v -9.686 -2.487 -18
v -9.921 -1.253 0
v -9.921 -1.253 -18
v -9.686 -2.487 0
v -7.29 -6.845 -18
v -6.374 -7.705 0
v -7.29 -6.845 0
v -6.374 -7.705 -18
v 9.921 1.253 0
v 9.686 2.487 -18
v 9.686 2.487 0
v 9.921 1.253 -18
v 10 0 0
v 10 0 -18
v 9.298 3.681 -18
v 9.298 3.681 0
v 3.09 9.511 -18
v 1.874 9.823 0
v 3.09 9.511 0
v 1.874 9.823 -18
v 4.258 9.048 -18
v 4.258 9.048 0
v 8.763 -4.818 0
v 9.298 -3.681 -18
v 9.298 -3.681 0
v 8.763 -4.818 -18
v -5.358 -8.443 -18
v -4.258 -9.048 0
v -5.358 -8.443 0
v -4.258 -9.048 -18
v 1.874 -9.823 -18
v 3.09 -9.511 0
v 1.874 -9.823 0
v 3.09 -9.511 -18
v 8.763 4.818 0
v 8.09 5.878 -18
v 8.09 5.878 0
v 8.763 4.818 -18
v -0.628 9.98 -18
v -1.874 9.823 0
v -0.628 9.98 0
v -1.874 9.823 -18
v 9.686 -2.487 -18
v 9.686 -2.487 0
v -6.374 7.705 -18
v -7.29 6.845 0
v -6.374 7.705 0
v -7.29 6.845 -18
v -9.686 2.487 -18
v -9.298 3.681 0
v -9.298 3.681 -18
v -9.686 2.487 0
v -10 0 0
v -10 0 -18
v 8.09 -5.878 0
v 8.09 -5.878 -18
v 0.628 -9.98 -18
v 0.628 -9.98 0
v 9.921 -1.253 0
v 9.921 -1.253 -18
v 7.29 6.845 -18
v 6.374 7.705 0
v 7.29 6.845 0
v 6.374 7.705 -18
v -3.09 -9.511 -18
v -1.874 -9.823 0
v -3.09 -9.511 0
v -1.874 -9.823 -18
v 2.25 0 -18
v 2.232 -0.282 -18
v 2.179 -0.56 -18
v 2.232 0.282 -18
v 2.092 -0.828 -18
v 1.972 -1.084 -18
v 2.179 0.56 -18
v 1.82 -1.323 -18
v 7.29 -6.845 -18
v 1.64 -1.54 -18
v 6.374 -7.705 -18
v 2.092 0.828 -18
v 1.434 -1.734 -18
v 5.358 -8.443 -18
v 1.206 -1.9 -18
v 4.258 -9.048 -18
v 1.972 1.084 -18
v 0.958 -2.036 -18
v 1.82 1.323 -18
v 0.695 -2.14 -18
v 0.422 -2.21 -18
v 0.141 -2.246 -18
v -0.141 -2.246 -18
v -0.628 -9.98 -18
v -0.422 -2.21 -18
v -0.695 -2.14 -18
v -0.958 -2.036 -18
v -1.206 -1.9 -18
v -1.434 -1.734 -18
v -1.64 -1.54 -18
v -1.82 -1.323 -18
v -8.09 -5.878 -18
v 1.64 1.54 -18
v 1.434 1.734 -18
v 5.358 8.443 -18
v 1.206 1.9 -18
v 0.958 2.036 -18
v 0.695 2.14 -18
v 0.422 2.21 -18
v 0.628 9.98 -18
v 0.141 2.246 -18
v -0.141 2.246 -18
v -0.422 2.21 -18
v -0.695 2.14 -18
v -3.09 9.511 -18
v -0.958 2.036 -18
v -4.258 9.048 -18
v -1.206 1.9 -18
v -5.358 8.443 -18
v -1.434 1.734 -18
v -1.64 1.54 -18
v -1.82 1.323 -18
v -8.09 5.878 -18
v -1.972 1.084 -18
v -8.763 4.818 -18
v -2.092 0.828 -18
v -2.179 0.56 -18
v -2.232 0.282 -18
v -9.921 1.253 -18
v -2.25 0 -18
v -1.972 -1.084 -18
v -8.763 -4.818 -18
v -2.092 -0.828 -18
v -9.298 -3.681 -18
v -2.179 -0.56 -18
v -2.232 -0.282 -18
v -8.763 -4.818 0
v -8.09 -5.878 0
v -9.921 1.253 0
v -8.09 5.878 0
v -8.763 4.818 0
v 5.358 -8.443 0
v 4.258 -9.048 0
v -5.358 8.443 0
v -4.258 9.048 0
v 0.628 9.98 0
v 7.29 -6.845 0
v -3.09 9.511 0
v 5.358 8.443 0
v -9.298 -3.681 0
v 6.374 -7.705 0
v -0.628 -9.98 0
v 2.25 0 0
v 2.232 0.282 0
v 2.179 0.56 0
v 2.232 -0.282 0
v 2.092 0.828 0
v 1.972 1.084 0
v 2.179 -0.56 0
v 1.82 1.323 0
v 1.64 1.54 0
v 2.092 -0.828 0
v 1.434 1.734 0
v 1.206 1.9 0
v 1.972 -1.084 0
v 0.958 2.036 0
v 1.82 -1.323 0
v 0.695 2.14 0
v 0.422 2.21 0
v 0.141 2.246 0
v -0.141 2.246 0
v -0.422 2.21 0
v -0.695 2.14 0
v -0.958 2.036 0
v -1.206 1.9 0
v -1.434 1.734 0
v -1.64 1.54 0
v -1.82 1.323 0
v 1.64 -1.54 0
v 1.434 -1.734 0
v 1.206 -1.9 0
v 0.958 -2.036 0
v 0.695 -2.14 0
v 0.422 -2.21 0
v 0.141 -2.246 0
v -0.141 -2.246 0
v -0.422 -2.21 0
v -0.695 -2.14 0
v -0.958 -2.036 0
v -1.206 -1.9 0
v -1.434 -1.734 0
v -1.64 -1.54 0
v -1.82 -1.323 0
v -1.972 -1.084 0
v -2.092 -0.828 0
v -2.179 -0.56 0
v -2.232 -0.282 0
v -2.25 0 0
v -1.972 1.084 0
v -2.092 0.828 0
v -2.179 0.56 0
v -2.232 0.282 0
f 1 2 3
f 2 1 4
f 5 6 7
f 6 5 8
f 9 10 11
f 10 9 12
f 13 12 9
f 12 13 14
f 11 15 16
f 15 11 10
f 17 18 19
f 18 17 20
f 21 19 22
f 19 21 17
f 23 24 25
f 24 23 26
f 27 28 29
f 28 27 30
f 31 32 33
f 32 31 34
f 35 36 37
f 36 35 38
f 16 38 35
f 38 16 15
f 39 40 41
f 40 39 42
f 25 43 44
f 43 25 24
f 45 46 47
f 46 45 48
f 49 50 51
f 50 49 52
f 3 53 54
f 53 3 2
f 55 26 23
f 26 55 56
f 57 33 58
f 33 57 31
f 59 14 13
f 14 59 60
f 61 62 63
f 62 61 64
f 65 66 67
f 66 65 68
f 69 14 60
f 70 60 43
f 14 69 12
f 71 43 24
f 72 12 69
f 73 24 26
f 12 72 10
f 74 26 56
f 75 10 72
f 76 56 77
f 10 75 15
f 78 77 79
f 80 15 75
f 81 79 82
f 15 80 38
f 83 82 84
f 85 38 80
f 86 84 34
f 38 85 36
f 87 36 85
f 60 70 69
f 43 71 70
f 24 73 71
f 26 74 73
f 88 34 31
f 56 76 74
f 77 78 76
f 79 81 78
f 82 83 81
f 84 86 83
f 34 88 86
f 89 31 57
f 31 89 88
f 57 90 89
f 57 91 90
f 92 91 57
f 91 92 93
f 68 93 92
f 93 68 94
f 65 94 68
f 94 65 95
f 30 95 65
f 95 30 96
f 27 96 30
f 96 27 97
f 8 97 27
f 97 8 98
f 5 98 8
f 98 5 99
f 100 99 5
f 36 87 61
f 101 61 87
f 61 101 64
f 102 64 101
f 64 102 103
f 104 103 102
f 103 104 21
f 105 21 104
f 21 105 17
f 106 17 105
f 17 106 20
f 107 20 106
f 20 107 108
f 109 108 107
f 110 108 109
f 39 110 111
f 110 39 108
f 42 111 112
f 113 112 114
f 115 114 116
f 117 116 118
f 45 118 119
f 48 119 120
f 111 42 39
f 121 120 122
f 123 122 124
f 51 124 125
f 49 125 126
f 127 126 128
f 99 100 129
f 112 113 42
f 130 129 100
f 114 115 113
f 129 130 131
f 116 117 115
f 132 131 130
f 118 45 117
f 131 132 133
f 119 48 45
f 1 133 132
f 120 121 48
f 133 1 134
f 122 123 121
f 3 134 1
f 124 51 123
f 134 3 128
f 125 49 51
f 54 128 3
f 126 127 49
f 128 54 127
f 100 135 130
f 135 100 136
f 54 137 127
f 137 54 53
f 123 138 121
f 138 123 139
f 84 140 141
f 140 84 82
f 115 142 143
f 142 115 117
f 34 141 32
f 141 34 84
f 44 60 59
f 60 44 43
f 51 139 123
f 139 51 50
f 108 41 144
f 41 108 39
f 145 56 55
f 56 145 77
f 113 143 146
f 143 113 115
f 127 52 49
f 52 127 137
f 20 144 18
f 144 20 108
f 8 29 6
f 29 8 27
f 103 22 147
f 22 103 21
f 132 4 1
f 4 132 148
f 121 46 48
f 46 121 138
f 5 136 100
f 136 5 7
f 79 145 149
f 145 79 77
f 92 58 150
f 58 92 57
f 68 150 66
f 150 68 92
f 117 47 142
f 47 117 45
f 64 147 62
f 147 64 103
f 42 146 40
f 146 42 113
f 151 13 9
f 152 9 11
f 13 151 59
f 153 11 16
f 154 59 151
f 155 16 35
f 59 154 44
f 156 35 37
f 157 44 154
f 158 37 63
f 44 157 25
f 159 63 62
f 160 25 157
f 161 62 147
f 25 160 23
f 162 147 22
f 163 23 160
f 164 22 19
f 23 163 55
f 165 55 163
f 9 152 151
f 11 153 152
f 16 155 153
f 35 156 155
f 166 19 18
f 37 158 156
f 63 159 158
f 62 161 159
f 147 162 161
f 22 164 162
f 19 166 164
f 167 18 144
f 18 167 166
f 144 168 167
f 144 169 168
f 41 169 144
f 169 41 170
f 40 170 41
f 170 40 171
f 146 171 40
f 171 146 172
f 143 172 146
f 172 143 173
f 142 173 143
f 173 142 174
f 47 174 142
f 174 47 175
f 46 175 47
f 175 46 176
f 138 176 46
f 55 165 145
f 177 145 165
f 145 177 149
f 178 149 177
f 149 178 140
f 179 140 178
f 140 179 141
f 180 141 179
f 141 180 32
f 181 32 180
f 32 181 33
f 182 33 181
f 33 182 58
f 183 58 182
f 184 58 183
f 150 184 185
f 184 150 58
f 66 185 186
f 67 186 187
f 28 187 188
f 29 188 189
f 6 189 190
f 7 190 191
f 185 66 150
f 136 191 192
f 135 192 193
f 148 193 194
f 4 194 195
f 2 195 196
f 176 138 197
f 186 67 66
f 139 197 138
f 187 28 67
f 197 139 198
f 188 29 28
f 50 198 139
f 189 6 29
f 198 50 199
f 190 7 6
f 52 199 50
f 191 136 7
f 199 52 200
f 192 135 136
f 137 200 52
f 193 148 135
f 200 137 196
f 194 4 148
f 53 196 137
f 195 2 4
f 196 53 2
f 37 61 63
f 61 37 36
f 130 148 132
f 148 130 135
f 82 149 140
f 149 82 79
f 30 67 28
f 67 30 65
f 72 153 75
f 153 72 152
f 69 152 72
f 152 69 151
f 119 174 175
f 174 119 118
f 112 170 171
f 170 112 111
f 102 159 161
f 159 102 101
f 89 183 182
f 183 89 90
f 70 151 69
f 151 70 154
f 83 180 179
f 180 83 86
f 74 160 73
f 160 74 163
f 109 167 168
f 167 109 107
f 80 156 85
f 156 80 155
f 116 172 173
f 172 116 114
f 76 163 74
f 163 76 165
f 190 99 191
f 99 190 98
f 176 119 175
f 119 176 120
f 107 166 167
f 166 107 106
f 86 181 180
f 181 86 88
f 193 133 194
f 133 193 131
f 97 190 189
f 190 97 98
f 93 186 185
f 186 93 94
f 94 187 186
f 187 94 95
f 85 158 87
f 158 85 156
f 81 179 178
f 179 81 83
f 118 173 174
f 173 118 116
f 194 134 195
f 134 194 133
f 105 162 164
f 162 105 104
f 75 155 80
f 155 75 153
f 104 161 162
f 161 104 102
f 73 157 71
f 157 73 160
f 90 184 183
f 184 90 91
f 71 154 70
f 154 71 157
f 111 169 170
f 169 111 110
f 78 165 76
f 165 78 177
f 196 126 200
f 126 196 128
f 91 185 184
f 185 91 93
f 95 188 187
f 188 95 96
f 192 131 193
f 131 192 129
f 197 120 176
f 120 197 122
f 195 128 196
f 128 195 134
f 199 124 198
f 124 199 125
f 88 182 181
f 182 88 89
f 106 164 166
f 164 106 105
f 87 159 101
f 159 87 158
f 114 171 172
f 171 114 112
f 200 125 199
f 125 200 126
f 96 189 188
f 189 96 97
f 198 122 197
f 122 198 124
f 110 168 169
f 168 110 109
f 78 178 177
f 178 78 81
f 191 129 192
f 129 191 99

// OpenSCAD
$fn = 50;


difference() {
	union() {
		translate(v = [0, 0, -18.0000000000]) {
			cylinder(h = 18, r = 10.0000000000);
		}
		cylinder(h = 0, r = 19.0000000000);
	}
	union() {
		#translate(v = [0, 0, -18]) {
			cylinder(h = 18, r = 2.2500000000);
		}
	}
}
